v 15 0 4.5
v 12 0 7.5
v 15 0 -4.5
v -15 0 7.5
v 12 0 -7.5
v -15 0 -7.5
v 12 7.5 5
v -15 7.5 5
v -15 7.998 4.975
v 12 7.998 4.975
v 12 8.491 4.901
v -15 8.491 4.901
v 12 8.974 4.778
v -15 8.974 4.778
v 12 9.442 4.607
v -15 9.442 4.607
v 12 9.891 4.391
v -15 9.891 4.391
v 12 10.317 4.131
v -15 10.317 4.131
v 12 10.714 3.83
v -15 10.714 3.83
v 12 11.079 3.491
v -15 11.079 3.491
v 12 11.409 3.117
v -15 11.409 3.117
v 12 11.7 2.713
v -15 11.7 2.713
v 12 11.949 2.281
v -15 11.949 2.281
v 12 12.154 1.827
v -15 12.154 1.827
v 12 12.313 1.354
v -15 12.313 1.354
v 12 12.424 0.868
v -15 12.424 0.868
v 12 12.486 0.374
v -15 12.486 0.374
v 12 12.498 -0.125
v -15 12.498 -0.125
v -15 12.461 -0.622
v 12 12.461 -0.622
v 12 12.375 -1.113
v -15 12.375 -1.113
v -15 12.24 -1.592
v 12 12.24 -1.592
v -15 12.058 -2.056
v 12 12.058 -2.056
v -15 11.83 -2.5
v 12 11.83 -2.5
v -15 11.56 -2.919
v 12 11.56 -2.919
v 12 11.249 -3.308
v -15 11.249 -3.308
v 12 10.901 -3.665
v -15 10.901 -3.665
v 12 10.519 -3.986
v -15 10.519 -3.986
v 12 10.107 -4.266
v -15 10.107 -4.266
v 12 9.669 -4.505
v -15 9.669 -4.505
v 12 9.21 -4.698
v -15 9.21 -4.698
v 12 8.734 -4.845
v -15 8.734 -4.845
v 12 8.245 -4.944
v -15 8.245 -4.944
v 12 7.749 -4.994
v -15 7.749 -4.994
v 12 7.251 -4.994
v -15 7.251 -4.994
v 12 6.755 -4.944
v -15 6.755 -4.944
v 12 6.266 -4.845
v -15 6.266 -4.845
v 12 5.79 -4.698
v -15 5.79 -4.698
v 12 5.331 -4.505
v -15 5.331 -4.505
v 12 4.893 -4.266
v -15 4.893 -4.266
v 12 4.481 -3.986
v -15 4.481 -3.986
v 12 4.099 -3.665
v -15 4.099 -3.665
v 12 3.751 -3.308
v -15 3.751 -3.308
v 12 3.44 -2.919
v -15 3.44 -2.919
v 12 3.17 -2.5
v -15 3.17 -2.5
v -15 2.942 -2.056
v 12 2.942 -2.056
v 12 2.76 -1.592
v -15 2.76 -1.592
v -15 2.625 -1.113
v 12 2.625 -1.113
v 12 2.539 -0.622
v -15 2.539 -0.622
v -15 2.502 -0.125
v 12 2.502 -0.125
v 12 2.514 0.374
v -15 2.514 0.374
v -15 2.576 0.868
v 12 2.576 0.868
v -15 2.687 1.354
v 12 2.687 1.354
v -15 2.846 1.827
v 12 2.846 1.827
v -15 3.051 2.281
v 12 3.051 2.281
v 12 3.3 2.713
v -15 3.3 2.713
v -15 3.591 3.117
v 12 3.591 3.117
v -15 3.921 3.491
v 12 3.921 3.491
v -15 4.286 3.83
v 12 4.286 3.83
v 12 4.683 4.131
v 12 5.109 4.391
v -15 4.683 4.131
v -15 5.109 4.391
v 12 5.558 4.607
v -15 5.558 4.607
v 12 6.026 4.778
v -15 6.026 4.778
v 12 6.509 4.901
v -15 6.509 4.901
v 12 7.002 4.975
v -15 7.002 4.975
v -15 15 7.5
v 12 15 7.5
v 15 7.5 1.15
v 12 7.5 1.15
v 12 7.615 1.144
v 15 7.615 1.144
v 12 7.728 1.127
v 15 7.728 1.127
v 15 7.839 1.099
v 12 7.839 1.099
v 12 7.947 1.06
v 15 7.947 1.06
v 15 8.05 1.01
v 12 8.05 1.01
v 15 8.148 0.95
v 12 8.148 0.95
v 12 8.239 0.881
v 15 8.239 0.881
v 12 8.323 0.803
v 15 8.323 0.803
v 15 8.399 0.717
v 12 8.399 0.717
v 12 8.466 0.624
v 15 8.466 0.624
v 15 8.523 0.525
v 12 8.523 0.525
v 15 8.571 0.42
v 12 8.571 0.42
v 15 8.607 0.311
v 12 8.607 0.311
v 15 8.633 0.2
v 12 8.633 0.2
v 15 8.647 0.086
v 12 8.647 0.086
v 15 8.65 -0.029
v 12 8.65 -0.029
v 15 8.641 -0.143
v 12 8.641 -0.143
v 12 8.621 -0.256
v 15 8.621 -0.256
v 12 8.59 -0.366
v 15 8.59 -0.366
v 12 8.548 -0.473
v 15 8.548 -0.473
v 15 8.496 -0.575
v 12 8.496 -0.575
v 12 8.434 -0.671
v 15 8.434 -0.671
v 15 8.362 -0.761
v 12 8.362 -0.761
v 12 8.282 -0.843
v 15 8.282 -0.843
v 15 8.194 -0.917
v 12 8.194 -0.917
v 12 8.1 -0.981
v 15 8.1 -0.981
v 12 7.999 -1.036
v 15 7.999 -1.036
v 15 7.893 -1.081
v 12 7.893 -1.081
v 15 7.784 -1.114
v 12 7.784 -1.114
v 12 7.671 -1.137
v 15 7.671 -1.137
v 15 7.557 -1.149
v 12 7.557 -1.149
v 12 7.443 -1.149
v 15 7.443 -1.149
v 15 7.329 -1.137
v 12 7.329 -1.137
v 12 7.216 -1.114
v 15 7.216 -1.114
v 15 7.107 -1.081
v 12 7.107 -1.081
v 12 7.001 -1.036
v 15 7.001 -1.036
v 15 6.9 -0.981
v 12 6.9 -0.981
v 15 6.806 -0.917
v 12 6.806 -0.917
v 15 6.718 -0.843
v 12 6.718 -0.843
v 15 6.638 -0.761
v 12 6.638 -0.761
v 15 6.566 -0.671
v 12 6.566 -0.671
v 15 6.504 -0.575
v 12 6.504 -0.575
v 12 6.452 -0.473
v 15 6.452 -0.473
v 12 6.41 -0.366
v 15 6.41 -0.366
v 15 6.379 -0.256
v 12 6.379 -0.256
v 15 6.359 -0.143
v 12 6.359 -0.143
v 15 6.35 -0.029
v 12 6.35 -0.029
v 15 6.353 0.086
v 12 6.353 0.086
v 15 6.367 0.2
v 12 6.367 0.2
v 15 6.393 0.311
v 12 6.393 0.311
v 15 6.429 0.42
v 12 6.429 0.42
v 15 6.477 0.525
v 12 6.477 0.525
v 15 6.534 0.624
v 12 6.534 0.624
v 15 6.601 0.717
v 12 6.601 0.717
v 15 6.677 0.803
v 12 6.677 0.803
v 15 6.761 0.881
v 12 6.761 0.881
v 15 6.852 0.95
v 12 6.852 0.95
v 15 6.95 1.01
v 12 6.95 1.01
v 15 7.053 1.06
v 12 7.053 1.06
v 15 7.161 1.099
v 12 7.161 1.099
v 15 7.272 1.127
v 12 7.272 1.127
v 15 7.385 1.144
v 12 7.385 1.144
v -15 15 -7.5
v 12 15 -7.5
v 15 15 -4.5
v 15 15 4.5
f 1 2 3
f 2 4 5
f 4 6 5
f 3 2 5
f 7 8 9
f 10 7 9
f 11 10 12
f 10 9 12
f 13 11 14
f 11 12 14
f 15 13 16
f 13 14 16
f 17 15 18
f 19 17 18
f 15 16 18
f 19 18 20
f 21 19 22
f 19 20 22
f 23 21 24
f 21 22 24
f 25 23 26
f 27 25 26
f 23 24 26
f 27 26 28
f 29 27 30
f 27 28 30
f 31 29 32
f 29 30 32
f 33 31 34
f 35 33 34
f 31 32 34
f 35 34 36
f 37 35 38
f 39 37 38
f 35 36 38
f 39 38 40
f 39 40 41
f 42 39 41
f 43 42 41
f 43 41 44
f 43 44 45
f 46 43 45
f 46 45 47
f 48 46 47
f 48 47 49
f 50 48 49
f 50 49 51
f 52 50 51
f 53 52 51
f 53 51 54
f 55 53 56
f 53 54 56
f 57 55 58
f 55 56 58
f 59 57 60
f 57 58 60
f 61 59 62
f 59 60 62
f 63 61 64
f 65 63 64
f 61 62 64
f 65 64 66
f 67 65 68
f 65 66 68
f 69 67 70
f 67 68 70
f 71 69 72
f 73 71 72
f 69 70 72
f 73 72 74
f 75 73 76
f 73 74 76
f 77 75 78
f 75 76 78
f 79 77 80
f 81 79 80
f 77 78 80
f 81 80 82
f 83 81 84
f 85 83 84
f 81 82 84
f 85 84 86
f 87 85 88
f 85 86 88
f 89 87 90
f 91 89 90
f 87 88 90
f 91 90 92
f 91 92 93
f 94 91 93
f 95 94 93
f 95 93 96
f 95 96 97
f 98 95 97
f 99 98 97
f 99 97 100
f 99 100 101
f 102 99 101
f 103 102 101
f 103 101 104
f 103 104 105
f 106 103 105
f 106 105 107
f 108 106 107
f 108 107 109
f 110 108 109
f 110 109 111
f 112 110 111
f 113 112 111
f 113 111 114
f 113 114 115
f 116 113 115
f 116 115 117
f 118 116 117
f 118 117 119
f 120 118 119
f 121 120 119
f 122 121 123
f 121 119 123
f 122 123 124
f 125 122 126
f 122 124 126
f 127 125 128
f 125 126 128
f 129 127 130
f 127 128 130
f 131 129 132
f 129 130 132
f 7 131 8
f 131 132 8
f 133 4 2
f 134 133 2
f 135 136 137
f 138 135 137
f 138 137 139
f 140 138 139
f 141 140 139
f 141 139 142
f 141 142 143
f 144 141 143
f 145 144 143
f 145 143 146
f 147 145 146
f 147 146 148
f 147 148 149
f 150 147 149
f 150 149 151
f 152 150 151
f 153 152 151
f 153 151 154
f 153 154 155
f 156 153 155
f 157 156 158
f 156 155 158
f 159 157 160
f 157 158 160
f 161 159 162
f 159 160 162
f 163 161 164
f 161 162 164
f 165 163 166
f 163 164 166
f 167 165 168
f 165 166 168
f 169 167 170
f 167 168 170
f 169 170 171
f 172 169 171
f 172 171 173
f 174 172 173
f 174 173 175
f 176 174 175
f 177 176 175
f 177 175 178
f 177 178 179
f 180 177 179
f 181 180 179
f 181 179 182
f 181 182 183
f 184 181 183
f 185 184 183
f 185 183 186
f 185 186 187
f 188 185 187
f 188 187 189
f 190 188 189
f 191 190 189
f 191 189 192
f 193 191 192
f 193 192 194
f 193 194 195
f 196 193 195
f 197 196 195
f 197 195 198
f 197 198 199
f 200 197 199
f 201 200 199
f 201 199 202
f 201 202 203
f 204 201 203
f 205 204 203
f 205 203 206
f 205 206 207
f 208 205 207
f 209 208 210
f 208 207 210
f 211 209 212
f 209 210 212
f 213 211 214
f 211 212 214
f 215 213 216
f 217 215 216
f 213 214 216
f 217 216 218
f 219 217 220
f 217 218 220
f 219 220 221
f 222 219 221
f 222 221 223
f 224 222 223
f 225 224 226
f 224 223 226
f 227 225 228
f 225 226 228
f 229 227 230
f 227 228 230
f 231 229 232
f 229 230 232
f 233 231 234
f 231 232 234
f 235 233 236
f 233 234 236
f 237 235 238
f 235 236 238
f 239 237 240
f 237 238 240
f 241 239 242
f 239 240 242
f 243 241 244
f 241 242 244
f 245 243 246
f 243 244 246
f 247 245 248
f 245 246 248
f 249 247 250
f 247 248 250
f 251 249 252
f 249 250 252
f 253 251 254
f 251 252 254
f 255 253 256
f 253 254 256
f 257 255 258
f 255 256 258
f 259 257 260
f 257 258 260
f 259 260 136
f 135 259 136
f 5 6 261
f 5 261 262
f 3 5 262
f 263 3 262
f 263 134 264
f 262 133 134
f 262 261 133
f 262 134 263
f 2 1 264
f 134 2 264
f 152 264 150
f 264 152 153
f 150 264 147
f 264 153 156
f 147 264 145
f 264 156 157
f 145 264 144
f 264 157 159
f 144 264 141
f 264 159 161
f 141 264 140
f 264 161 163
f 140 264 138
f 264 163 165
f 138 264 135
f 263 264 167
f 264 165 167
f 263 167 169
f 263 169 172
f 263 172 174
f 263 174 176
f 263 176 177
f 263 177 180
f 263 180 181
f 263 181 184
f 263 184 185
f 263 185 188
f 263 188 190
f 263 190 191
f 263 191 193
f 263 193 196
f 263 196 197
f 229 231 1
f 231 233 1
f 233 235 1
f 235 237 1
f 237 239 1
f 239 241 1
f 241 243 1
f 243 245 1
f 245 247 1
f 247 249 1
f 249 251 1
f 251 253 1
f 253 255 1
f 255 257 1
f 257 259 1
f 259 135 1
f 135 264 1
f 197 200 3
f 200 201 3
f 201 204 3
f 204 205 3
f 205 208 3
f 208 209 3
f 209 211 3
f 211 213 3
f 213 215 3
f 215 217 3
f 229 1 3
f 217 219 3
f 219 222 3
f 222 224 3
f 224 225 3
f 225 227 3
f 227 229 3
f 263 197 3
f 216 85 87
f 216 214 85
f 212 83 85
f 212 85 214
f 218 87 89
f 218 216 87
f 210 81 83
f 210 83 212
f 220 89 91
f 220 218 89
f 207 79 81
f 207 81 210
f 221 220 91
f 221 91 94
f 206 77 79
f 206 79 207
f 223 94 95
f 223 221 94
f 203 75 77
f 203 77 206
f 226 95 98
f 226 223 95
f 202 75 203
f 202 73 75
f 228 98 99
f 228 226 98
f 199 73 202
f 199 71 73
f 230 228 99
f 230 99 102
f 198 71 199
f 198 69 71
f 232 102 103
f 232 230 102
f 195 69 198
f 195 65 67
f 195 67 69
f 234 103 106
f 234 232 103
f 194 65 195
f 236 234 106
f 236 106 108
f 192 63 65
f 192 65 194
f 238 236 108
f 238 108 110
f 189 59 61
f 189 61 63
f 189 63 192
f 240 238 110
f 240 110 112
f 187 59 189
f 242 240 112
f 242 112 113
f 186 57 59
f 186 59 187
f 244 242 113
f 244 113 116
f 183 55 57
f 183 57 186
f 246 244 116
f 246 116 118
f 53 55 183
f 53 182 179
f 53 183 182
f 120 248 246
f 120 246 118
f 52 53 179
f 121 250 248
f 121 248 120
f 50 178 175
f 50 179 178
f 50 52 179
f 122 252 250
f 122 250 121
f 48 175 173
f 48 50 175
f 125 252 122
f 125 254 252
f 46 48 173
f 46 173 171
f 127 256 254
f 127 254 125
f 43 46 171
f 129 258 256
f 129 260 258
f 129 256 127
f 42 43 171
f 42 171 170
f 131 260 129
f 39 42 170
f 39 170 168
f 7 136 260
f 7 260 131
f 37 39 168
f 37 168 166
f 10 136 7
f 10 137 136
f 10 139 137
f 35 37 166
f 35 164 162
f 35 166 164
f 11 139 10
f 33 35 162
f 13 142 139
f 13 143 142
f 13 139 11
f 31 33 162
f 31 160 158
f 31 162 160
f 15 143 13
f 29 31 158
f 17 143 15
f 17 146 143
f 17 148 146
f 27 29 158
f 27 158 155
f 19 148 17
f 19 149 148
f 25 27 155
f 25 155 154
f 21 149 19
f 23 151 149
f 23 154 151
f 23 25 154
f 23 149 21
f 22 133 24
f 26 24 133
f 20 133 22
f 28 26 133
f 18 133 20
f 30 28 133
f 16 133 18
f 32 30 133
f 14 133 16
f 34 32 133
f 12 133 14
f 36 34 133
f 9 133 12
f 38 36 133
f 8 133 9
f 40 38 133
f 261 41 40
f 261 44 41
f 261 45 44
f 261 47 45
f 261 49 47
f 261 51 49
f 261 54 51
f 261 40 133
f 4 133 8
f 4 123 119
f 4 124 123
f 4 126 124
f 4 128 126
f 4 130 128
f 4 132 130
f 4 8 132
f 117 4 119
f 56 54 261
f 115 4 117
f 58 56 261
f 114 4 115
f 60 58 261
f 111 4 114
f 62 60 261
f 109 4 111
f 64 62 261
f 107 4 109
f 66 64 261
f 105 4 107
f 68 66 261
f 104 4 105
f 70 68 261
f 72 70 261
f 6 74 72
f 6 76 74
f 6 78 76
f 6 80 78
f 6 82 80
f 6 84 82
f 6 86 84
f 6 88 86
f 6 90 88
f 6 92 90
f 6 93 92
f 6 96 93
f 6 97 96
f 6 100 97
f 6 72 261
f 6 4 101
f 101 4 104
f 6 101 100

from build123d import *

# Parameters (mm, degrees)
SKETCH1_W           = 30
SKETCH1_H           = 15
BOSS_EXTRUDE1_DEPTH = 15
CHAMFER1_SIZE       = 3
SKETCH2_R           = 5
CUT_EXTRUDE1_DEPTH  = 27
SKETCH3_R           = 1.15
CUT_EXTRUDE2_DEPTH  = 7


with BuildPart() as part:
    # Sketch1 → Boss-Extrude1 (new body)
    with BuildSketch(Plane(origin=(0, 0, 0), x_dir=(1, 0, 0), z_dir=(0, 1, 0))):
        Rectangle(SKETCH1_W, SKETCH1_H)
    extrude(amount=BOSS_EXTRUDE1_DEPTH)

    # Chamfer1
    chamfer1_edges = [part.edges().sort_by_distance(p)[0] for p in [
        (15, 7.5, 7.5),
        (15, 7.5, -7.5),
    ]]
    chamfer(chamfer1_edges, length=CHAMFER1_SIZE)

    # Sketch2 → Cut-Extrude1 (cut)
    with BuildSketch(Plane.ZY.offset(15)):
        with Locations((0, 7.5)):
            Circle(SKETCH2_R)
    extrude(amount=-CUT_EXTRUDE1_DEPTH, mode=Mode.SUBTRACT)

    # Sketch3 → Cut-Extrude2 (cut)
    with BuildSketch(Plane.ZY.offset(-12)):
        with Locations((0, 7.5)):
            Circle(SKETCH3_R)
    extrude(amount=-CUT_EXTRUDE2_DEPTH, mode=Mode.SUBTRACT)


solid = part.part
